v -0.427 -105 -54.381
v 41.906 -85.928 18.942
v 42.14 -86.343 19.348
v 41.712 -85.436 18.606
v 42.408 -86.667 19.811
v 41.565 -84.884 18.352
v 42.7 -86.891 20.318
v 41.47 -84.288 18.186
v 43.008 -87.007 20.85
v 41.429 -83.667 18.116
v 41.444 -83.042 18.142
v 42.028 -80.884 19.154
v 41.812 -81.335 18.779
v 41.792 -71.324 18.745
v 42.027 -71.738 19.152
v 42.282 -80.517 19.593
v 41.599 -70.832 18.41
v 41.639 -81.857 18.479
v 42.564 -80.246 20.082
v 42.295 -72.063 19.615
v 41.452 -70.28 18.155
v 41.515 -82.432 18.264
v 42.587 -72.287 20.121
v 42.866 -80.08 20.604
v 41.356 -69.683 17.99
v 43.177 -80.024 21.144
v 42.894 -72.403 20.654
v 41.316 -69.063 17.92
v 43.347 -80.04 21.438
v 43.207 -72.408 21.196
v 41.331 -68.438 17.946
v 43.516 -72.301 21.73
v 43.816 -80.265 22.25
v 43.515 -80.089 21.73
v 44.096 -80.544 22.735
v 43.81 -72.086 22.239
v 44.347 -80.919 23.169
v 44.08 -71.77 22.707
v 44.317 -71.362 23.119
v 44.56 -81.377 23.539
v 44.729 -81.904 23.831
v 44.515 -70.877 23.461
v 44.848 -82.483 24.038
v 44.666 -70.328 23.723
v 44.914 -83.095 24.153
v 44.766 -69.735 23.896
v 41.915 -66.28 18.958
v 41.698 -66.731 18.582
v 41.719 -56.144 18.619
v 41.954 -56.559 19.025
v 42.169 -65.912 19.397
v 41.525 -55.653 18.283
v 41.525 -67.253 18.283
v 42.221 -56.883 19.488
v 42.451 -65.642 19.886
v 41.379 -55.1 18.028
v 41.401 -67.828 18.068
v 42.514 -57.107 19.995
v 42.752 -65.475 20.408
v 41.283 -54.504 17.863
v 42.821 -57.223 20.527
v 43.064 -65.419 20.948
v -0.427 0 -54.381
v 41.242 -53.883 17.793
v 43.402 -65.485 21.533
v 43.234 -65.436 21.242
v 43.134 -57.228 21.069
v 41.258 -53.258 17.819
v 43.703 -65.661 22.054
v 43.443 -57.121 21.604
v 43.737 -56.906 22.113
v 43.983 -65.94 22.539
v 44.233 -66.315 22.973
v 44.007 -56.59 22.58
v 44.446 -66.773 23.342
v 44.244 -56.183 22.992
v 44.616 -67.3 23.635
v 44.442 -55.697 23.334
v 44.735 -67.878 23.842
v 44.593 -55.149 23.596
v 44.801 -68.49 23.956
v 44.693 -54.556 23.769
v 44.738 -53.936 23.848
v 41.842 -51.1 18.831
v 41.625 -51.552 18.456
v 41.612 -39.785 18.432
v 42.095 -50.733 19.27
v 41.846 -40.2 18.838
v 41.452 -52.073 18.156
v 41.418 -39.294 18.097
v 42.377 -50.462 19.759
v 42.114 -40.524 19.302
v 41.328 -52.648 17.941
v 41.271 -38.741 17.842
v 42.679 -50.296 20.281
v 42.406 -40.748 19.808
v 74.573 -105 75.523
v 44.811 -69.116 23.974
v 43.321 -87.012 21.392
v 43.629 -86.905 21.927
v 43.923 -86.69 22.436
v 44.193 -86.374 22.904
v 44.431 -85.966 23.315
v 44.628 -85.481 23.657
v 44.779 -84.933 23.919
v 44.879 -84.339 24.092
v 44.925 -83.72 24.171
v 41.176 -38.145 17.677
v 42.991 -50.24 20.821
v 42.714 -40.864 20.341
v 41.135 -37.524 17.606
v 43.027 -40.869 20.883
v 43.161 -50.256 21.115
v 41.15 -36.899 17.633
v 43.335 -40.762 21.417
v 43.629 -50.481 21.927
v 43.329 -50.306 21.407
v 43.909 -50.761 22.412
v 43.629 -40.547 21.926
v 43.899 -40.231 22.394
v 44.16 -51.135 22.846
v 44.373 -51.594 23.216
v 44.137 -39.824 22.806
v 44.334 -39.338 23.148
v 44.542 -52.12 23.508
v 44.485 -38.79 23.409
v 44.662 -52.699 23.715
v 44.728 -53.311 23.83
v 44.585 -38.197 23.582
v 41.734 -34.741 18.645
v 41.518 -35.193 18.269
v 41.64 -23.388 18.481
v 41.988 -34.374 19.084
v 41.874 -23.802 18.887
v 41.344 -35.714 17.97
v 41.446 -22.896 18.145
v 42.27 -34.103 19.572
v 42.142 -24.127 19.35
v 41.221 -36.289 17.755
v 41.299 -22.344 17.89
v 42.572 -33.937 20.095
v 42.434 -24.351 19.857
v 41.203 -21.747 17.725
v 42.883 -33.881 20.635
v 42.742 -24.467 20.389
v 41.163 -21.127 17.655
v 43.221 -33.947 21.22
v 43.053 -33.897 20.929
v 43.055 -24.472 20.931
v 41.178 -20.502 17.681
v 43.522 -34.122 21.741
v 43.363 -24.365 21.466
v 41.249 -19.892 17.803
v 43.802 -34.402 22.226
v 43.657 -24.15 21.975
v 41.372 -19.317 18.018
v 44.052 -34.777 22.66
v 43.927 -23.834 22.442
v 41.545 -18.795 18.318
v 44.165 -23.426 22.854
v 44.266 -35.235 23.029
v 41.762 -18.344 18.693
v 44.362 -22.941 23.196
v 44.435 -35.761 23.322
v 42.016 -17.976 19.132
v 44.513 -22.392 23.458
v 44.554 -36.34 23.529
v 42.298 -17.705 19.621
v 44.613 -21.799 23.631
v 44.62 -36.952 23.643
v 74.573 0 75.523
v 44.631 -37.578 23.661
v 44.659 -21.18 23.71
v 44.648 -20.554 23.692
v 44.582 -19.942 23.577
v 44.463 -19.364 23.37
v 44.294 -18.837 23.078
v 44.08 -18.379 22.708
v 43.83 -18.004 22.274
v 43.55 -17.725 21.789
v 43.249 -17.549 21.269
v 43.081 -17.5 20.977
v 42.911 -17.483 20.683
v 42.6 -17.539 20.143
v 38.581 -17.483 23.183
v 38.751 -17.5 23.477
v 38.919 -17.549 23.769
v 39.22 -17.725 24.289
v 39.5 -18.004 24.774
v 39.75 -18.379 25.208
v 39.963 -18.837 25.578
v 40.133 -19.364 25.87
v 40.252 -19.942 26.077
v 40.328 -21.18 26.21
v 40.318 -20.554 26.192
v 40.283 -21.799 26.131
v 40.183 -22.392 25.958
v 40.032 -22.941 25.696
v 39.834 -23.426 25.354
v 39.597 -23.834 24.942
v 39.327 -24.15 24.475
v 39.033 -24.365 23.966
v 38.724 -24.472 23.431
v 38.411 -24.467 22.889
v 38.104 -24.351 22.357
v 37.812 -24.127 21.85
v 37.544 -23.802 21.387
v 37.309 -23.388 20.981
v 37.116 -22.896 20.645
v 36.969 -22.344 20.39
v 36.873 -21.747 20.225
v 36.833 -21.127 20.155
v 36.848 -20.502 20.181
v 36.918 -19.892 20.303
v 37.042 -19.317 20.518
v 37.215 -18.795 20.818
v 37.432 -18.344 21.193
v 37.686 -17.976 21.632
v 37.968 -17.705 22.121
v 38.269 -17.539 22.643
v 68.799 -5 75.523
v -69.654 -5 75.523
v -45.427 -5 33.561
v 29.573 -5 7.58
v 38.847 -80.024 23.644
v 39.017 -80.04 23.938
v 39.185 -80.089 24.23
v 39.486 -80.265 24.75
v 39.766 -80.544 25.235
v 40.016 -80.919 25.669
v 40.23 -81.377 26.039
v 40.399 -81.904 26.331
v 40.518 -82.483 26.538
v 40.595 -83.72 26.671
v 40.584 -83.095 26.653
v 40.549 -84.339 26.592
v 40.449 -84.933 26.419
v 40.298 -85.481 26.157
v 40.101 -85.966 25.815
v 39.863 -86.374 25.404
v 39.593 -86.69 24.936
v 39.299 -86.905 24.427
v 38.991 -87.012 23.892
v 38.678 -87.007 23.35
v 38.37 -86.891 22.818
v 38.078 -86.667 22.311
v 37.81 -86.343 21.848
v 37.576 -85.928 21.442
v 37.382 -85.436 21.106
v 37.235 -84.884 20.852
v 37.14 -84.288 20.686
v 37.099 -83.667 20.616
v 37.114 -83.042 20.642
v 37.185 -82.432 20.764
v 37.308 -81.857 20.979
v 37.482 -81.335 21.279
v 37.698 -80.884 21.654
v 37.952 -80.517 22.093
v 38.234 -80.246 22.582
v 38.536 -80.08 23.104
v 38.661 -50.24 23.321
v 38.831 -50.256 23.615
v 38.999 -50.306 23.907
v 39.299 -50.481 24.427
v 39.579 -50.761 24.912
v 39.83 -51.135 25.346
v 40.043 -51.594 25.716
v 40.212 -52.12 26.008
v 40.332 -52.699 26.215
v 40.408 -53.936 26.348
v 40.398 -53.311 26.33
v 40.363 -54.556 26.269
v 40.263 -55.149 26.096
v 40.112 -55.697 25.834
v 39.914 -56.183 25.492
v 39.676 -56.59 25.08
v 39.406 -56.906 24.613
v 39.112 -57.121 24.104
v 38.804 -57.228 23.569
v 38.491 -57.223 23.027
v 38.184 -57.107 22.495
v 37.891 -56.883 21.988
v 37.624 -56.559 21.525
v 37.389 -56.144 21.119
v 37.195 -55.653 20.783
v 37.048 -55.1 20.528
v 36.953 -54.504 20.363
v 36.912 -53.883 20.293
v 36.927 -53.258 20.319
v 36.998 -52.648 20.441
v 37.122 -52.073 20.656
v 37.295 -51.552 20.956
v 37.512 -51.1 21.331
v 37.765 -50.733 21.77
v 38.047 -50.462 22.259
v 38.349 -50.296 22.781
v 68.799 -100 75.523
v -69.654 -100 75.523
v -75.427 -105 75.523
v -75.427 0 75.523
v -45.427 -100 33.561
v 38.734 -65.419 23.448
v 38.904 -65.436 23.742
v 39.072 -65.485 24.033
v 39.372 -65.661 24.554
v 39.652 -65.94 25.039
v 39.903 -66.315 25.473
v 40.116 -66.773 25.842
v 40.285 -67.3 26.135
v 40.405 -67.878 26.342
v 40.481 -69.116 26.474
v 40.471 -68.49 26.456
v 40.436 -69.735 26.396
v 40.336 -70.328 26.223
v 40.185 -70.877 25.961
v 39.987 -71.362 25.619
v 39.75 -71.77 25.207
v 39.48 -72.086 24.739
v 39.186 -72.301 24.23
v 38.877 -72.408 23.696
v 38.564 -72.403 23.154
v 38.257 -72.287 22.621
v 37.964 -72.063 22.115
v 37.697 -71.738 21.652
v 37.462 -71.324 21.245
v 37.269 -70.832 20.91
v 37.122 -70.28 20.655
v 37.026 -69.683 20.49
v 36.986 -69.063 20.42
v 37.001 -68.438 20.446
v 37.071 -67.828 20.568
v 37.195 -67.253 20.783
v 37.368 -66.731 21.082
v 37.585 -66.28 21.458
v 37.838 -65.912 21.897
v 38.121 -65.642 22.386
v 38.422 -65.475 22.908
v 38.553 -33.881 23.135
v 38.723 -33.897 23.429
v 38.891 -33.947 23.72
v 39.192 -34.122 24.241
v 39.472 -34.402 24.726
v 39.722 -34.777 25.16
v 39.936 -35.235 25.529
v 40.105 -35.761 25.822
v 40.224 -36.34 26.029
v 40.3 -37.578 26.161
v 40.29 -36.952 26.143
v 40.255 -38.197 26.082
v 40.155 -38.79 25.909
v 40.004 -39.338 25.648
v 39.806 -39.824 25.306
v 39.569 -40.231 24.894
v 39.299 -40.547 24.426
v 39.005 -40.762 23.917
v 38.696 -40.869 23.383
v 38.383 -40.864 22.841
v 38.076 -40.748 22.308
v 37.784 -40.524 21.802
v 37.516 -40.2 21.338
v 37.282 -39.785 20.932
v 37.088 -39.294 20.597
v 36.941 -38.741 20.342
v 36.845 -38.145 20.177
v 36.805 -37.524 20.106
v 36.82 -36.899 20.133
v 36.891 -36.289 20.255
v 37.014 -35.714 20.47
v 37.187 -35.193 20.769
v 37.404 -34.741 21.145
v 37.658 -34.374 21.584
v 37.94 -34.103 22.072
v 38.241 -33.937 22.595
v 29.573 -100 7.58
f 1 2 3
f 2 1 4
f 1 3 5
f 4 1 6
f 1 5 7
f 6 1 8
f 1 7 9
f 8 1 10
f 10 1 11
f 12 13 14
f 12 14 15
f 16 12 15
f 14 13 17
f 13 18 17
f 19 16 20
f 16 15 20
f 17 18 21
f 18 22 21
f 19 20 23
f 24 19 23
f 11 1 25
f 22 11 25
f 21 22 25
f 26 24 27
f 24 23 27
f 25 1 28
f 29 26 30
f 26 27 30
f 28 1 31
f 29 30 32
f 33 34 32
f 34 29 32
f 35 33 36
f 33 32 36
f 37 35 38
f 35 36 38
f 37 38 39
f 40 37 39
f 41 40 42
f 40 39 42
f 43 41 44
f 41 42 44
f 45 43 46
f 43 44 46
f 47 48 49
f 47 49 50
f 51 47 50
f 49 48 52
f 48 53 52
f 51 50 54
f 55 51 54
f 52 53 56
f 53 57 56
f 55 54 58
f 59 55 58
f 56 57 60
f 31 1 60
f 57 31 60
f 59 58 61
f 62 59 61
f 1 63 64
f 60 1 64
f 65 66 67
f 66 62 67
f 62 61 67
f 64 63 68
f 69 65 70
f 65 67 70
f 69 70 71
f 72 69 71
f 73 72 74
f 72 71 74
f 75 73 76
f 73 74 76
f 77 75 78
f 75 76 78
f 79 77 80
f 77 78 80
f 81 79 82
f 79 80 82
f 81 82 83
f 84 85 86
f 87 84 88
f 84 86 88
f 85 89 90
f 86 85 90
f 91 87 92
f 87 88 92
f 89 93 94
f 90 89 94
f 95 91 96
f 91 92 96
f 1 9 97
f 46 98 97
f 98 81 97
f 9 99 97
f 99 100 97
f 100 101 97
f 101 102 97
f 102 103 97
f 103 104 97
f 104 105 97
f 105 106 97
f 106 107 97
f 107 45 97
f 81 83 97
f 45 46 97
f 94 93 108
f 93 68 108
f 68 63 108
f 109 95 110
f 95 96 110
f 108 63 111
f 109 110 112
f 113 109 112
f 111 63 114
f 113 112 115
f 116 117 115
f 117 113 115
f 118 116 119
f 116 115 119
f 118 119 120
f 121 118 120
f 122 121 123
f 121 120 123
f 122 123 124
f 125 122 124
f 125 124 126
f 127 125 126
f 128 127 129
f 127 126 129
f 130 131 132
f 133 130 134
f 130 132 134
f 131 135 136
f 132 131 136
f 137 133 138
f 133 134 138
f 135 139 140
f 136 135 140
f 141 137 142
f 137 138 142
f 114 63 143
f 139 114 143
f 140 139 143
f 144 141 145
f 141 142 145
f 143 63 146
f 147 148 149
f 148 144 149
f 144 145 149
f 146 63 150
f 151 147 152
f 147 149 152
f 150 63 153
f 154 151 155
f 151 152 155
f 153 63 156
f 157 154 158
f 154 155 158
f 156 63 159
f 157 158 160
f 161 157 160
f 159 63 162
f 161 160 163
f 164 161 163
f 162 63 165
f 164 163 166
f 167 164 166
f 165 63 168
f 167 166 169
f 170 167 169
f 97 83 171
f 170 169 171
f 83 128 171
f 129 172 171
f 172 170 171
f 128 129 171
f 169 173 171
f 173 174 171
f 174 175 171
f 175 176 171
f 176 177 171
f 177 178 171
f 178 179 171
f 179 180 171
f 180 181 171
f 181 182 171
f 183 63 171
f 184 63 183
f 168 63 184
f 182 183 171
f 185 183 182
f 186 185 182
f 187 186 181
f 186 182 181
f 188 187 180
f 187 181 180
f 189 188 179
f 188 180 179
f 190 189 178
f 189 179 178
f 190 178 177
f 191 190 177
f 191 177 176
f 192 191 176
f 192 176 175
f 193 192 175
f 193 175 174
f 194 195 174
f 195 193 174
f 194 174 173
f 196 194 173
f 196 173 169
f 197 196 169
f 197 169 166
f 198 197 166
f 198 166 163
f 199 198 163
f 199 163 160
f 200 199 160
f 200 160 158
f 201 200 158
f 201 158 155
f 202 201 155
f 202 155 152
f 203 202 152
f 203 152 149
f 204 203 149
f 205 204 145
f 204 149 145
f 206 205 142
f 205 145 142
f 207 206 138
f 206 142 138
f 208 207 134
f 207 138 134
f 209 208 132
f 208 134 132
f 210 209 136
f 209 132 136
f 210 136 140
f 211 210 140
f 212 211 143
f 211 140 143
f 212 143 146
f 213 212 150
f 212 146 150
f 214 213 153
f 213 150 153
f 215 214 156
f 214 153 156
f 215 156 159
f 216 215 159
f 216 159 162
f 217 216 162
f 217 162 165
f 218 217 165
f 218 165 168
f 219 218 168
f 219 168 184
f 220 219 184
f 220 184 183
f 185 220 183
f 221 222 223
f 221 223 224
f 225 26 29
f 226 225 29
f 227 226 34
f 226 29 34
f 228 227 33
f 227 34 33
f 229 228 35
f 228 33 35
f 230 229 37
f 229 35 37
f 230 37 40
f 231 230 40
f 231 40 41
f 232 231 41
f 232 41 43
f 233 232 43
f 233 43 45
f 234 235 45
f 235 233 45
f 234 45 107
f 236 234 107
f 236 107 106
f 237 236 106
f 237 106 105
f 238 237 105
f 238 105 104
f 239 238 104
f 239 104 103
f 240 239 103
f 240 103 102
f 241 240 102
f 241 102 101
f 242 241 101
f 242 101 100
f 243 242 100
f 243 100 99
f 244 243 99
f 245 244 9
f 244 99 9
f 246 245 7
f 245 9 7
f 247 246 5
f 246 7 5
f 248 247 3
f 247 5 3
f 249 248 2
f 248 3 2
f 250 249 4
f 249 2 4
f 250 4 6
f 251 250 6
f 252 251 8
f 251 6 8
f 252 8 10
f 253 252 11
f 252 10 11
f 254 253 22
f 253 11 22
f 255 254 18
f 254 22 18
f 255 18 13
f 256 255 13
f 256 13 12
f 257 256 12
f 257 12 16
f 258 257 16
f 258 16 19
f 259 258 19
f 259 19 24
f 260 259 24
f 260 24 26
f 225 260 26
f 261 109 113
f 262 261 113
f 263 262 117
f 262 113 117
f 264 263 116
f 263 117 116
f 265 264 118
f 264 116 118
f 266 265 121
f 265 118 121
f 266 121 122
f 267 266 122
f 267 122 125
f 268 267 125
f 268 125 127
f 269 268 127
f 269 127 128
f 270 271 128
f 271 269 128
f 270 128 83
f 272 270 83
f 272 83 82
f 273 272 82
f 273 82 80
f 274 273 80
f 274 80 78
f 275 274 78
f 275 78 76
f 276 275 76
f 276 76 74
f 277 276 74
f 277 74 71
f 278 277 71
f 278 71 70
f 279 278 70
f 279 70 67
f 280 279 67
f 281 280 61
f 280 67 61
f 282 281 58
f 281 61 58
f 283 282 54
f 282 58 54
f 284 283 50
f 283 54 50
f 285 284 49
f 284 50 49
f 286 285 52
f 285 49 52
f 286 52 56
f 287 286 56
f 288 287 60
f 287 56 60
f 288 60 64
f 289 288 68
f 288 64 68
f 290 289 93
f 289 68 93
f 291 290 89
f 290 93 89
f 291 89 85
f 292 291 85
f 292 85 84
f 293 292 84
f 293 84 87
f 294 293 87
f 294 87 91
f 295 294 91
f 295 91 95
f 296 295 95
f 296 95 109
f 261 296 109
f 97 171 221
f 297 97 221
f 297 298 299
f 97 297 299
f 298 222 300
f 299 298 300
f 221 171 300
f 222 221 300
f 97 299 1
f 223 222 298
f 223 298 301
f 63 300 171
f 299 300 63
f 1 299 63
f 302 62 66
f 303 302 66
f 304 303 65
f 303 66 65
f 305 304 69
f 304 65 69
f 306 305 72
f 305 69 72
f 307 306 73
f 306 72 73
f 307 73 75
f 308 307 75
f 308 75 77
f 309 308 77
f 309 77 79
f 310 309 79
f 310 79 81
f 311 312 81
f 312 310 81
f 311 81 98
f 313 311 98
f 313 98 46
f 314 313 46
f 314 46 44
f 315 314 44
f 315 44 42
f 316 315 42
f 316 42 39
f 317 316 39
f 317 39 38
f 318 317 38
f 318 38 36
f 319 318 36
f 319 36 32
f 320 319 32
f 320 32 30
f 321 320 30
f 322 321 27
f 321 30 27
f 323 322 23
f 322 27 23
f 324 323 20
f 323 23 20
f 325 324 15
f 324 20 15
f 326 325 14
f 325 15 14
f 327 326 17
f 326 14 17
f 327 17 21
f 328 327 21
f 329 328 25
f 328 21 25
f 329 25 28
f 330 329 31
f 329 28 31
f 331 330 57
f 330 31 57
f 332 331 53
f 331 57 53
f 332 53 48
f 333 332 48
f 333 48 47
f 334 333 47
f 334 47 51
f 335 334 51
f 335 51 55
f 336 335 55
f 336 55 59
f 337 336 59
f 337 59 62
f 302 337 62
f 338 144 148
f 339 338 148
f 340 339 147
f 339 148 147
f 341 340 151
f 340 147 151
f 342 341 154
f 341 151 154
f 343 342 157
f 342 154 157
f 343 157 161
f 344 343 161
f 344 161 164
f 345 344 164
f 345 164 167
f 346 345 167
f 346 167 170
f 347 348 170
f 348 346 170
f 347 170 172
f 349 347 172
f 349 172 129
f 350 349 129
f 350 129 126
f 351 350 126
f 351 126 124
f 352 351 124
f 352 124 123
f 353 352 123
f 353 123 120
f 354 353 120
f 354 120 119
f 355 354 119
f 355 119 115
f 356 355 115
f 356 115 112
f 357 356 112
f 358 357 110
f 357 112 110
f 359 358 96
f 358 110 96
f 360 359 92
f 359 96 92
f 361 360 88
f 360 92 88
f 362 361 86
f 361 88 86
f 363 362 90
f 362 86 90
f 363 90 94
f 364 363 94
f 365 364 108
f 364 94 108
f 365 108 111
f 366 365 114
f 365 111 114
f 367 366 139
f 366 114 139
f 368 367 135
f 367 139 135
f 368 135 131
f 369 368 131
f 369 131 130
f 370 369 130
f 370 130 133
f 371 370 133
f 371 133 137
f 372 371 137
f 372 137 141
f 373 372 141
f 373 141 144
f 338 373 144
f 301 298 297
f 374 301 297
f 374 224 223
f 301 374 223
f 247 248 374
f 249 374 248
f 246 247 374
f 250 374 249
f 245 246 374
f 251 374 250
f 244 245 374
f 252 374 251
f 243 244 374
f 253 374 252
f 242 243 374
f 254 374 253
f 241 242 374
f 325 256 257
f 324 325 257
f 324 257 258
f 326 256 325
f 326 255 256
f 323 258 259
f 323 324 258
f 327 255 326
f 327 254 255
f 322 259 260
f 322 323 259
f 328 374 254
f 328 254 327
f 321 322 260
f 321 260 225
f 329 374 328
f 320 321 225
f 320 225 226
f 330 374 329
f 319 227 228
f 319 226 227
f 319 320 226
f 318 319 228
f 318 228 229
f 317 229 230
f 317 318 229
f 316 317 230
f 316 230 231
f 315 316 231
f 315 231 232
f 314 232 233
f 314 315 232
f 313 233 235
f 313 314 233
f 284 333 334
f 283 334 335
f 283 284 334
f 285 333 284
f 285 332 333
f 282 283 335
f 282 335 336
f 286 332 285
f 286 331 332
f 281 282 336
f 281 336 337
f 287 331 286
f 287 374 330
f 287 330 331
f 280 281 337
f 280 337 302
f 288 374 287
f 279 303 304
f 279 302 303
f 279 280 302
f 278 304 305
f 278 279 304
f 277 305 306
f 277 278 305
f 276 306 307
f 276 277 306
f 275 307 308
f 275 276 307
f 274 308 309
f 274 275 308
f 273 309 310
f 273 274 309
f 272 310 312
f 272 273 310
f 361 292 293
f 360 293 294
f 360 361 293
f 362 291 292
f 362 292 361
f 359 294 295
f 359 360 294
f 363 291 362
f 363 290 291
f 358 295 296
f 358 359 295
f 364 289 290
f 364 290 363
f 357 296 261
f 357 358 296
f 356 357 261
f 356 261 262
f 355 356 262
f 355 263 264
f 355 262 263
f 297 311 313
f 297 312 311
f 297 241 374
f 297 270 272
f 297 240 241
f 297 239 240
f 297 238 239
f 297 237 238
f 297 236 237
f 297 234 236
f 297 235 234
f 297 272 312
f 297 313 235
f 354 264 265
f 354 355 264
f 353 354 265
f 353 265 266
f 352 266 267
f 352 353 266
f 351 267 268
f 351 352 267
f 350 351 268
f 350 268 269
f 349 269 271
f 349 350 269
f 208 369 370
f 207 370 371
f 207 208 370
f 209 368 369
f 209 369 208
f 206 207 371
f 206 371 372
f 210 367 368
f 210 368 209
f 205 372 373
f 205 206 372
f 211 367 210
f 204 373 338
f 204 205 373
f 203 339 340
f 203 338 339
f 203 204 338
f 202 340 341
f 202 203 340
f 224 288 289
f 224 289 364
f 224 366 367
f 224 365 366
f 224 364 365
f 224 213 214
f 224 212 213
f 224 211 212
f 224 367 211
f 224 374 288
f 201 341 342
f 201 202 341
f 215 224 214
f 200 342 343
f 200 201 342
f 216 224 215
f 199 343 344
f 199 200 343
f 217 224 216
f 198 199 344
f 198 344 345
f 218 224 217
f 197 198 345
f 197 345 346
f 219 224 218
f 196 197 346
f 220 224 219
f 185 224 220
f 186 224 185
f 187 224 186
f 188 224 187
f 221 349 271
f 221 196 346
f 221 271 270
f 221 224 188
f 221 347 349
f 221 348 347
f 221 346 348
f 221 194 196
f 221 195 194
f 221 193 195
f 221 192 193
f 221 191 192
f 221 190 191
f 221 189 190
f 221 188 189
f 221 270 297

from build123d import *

# Parameters (mm, degrees)
F1_DEPTH = 105
F2_T     = -5
F4_DEPTH = 95
F6_D     = 7


with BuildPart() as f1:
    # F0 (on Front) → F1 (new body)
    with BuildSketch(Plane.XZ):
        Polygon((74.57273, 75.522542), (-75.42727, 75.522542), (-0.42727, -54.381269), align=None)
    extrude(amount=F1_DEPTH)

    # F2
    f2_openings = [f1.faces().sort_by_distance(p)[0] for p in [
        (-0.42727, -52.5, 75.522542),
    ]]
    offset(amount=F2_T, openings=f2_openings)

    # F3 (on face) → F4 (join)
    with BuildSketch(Plane.XZ.offset(5)):
        Polygon((29.57273, 7.580256), (-45.42727, 33.561018), (-0.42727, -44.381269), align=None)
    extrude(amount=F4_DEPTH)

    # F6 (through all)
    with Locations(Plane(origin=(18.897201, 0, -10.910304), x_dir=(0, -1, 0), z_dir=(-0.866025, 0, 0.5))):
        with Locations((83.523616, 39.900303), (20.983379, 39.36794), (37.380986, 39.312027), (53.739835, 39.52726), (68.919398, 39.673682)):
            Hole(F6_D / 2)


solid = f1.part
